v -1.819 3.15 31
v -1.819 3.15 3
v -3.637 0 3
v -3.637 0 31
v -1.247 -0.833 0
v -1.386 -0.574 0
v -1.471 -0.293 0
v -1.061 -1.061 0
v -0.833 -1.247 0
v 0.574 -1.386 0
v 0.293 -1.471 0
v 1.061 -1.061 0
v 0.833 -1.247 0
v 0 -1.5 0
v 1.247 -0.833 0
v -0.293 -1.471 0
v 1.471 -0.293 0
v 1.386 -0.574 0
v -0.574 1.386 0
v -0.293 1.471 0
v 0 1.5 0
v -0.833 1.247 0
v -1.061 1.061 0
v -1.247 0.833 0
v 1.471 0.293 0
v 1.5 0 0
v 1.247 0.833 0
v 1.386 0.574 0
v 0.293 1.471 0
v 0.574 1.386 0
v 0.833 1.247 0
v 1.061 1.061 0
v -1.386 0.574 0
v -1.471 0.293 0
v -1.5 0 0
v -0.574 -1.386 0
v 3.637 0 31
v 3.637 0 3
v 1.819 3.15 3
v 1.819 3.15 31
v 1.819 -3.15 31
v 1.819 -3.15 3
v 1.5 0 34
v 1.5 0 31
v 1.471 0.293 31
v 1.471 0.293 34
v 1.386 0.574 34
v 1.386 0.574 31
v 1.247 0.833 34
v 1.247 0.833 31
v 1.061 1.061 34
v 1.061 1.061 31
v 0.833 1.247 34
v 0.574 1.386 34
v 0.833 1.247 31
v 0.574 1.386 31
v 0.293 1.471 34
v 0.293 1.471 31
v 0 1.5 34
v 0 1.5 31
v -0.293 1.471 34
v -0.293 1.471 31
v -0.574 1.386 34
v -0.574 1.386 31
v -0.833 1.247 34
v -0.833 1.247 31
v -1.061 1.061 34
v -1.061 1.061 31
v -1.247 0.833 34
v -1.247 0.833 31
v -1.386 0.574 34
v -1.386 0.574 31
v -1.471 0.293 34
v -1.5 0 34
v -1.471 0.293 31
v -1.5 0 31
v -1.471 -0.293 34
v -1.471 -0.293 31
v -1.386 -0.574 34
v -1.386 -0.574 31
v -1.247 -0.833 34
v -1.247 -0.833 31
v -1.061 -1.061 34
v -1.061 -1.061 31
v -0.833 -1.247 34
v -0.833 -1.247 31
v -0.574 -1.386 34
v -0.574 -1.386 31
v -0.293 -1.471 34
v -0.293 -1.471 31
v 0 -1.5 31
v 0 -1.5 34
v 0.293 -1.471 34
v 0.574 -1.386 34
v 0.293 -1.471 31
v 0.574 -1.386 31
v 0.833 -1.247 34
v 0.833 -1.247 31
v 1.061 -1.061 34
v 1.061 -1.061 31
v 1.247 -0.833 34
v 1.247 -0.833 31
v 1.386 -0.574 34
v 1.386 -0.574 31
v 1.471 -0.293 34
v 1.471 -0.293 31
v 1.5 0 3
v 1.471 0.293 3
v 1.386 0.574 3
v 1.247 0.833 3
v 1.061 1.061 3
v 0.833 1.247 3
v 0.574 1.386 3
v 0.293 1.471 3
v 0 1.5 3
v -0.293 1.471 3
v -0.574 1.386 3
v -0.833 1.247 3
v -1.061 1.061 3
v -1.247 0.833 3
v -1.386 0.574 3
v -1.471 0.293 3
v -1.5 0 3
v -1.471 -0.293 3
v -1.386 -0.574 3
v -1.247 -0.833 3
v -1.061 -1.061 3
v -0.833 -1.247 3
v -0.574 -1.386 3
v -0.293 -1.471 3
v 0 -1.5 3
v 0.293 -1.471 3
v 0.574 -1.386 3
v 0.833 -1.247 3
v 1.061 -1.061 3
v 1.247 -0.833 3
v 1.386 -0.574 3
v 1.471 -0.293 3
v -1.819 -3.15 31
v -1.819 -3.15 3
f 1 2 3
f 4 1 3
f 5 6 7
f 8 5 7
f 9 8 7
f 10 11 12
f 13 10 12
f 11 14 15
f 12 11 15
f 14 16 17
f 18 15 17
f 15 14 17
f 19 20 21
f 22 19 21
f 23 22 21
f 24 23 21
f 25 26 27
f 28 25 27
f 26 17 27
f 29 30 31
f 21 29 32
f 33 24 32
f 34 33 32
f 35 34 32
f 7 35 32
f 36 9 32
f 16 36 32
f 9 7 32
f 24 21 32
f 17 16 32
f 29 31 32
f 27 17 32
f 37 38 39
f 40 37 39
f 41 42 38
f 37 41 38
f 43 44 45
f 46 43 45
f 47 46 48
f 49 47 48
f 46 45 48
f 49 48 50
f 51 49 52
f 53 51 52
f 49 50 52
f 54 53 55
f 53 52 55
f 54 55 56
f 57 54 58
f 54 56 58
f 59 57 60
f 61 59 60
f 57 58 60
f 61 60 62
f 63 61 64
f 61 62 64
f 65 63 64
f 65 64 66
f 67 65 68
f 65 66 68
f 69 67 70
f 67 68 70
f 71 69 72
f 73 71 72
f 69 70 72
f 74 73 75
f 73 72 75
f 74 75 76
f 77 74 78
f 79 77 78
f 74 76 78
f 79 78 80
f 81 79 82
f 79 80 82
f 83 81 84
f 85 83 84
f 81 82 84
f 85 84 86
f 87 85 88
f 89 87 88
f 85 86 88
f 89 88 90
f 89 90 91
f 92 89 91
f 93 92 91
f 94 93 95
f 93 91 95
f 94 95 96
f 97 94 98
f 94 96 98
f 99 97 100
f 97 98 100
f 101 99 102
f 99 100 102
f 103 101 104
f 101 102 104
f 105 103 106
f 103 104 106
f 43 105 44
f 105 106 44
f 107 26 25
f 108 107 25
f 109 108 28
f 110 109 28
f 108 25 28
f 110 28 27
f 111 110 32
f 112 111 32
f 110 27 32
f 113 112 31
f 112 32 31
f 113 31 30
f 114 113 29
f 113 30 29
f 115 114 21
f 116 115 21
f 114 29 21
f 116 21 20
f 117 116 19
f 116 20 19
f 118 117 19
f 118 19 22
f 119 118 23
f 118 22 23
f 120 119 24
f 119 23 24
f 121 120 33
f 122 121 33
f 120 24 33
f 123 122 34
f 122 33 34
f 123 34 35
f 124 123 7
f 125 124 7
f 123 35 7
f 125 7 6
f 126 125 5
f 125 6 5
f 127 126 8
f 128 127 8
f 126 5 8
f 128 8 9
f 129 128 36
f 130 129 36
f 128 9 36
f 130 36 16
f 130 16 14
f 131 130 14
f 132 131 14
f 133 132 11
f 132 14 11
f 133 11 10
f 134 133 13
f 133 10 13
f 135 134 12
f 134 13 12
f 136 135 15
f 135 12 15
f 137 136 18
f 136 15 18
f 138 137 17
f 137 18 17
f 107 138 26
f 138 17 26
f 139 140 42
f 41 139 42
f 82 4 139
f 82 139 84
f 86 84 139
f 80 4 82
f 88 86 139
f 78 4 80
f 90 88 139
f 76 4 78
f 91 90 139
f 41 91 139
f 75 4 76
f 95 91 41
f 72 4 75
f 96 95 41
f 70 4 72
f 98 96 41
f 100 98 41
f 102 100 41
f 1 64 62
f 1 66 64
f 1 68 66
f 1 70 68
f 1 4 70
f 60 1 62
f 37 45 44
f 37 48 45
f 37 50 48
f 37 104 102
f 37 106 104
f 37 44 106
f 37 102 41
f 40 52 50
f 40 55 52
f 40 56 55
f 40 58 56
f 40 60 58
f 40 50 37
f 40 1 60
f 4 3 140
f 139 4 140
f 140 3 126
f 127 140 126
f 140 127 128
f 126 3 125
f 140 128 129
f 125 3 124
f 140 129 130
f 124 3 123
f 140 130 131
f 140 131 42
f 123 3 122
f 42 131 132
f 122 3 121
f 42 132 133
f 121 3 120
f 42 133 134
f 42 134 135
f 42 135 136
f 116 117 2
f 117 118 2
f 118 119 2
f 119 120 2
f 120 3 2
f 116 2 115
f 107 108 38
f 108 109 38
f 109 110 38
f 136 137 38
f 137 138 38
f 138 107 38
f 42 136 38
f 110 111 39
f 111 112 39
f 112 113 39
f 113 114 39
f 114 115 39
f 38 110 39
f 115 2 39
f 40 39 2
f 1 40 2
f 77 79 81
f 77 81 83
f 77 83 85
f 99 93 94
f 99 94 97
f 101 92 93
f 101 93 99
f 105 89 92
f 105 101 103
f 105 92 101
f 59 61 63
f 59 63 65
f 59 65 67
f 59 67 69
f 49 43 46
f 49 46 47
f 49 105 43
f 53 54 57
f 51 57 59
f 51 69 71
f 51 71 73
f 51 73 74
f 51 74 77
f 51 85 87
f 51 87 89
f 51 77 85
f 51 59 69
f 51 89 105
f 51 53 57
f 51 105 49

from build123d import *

# Parameters (mm, degrees)
F0_R     = 1.5
F1_DEPTH = 3
F2_R     = 1.5
F3_DEPTH = 28
F4_R     = 1.5
F5_DEPTH = 3


with BuildPart() as f1:
    # F0 (on Top) → F1 (new body)
    with BuildSketch(Plane.XY):
        Circle(F0_R)
    extrude(amount=F1_DEPTH)

    # F2 (on face) → F3 (join)
    with BuildSketch(Plane.XY.offset(3)):
        Polygon((1.8186533479, 3.15), (-1.8186533479, 3.15), (-3.6373066959, 0), (-1.8186533479, -3.15), (1.8186533479, -3.15), (3.6373066959, 0), align=None)
        Circle(F2_R, mode=Mode.SUBTRACT)
        Circle(F2_R)
    extrude(amount=F3_DEPTH)

    # F4 (on face) → F5 (join)
    with BuildSketch(Plane.XY.offset(31)):
        Circle(F4_R)
    extrude(amount=F5_DEPTH)


solid = f1.part
